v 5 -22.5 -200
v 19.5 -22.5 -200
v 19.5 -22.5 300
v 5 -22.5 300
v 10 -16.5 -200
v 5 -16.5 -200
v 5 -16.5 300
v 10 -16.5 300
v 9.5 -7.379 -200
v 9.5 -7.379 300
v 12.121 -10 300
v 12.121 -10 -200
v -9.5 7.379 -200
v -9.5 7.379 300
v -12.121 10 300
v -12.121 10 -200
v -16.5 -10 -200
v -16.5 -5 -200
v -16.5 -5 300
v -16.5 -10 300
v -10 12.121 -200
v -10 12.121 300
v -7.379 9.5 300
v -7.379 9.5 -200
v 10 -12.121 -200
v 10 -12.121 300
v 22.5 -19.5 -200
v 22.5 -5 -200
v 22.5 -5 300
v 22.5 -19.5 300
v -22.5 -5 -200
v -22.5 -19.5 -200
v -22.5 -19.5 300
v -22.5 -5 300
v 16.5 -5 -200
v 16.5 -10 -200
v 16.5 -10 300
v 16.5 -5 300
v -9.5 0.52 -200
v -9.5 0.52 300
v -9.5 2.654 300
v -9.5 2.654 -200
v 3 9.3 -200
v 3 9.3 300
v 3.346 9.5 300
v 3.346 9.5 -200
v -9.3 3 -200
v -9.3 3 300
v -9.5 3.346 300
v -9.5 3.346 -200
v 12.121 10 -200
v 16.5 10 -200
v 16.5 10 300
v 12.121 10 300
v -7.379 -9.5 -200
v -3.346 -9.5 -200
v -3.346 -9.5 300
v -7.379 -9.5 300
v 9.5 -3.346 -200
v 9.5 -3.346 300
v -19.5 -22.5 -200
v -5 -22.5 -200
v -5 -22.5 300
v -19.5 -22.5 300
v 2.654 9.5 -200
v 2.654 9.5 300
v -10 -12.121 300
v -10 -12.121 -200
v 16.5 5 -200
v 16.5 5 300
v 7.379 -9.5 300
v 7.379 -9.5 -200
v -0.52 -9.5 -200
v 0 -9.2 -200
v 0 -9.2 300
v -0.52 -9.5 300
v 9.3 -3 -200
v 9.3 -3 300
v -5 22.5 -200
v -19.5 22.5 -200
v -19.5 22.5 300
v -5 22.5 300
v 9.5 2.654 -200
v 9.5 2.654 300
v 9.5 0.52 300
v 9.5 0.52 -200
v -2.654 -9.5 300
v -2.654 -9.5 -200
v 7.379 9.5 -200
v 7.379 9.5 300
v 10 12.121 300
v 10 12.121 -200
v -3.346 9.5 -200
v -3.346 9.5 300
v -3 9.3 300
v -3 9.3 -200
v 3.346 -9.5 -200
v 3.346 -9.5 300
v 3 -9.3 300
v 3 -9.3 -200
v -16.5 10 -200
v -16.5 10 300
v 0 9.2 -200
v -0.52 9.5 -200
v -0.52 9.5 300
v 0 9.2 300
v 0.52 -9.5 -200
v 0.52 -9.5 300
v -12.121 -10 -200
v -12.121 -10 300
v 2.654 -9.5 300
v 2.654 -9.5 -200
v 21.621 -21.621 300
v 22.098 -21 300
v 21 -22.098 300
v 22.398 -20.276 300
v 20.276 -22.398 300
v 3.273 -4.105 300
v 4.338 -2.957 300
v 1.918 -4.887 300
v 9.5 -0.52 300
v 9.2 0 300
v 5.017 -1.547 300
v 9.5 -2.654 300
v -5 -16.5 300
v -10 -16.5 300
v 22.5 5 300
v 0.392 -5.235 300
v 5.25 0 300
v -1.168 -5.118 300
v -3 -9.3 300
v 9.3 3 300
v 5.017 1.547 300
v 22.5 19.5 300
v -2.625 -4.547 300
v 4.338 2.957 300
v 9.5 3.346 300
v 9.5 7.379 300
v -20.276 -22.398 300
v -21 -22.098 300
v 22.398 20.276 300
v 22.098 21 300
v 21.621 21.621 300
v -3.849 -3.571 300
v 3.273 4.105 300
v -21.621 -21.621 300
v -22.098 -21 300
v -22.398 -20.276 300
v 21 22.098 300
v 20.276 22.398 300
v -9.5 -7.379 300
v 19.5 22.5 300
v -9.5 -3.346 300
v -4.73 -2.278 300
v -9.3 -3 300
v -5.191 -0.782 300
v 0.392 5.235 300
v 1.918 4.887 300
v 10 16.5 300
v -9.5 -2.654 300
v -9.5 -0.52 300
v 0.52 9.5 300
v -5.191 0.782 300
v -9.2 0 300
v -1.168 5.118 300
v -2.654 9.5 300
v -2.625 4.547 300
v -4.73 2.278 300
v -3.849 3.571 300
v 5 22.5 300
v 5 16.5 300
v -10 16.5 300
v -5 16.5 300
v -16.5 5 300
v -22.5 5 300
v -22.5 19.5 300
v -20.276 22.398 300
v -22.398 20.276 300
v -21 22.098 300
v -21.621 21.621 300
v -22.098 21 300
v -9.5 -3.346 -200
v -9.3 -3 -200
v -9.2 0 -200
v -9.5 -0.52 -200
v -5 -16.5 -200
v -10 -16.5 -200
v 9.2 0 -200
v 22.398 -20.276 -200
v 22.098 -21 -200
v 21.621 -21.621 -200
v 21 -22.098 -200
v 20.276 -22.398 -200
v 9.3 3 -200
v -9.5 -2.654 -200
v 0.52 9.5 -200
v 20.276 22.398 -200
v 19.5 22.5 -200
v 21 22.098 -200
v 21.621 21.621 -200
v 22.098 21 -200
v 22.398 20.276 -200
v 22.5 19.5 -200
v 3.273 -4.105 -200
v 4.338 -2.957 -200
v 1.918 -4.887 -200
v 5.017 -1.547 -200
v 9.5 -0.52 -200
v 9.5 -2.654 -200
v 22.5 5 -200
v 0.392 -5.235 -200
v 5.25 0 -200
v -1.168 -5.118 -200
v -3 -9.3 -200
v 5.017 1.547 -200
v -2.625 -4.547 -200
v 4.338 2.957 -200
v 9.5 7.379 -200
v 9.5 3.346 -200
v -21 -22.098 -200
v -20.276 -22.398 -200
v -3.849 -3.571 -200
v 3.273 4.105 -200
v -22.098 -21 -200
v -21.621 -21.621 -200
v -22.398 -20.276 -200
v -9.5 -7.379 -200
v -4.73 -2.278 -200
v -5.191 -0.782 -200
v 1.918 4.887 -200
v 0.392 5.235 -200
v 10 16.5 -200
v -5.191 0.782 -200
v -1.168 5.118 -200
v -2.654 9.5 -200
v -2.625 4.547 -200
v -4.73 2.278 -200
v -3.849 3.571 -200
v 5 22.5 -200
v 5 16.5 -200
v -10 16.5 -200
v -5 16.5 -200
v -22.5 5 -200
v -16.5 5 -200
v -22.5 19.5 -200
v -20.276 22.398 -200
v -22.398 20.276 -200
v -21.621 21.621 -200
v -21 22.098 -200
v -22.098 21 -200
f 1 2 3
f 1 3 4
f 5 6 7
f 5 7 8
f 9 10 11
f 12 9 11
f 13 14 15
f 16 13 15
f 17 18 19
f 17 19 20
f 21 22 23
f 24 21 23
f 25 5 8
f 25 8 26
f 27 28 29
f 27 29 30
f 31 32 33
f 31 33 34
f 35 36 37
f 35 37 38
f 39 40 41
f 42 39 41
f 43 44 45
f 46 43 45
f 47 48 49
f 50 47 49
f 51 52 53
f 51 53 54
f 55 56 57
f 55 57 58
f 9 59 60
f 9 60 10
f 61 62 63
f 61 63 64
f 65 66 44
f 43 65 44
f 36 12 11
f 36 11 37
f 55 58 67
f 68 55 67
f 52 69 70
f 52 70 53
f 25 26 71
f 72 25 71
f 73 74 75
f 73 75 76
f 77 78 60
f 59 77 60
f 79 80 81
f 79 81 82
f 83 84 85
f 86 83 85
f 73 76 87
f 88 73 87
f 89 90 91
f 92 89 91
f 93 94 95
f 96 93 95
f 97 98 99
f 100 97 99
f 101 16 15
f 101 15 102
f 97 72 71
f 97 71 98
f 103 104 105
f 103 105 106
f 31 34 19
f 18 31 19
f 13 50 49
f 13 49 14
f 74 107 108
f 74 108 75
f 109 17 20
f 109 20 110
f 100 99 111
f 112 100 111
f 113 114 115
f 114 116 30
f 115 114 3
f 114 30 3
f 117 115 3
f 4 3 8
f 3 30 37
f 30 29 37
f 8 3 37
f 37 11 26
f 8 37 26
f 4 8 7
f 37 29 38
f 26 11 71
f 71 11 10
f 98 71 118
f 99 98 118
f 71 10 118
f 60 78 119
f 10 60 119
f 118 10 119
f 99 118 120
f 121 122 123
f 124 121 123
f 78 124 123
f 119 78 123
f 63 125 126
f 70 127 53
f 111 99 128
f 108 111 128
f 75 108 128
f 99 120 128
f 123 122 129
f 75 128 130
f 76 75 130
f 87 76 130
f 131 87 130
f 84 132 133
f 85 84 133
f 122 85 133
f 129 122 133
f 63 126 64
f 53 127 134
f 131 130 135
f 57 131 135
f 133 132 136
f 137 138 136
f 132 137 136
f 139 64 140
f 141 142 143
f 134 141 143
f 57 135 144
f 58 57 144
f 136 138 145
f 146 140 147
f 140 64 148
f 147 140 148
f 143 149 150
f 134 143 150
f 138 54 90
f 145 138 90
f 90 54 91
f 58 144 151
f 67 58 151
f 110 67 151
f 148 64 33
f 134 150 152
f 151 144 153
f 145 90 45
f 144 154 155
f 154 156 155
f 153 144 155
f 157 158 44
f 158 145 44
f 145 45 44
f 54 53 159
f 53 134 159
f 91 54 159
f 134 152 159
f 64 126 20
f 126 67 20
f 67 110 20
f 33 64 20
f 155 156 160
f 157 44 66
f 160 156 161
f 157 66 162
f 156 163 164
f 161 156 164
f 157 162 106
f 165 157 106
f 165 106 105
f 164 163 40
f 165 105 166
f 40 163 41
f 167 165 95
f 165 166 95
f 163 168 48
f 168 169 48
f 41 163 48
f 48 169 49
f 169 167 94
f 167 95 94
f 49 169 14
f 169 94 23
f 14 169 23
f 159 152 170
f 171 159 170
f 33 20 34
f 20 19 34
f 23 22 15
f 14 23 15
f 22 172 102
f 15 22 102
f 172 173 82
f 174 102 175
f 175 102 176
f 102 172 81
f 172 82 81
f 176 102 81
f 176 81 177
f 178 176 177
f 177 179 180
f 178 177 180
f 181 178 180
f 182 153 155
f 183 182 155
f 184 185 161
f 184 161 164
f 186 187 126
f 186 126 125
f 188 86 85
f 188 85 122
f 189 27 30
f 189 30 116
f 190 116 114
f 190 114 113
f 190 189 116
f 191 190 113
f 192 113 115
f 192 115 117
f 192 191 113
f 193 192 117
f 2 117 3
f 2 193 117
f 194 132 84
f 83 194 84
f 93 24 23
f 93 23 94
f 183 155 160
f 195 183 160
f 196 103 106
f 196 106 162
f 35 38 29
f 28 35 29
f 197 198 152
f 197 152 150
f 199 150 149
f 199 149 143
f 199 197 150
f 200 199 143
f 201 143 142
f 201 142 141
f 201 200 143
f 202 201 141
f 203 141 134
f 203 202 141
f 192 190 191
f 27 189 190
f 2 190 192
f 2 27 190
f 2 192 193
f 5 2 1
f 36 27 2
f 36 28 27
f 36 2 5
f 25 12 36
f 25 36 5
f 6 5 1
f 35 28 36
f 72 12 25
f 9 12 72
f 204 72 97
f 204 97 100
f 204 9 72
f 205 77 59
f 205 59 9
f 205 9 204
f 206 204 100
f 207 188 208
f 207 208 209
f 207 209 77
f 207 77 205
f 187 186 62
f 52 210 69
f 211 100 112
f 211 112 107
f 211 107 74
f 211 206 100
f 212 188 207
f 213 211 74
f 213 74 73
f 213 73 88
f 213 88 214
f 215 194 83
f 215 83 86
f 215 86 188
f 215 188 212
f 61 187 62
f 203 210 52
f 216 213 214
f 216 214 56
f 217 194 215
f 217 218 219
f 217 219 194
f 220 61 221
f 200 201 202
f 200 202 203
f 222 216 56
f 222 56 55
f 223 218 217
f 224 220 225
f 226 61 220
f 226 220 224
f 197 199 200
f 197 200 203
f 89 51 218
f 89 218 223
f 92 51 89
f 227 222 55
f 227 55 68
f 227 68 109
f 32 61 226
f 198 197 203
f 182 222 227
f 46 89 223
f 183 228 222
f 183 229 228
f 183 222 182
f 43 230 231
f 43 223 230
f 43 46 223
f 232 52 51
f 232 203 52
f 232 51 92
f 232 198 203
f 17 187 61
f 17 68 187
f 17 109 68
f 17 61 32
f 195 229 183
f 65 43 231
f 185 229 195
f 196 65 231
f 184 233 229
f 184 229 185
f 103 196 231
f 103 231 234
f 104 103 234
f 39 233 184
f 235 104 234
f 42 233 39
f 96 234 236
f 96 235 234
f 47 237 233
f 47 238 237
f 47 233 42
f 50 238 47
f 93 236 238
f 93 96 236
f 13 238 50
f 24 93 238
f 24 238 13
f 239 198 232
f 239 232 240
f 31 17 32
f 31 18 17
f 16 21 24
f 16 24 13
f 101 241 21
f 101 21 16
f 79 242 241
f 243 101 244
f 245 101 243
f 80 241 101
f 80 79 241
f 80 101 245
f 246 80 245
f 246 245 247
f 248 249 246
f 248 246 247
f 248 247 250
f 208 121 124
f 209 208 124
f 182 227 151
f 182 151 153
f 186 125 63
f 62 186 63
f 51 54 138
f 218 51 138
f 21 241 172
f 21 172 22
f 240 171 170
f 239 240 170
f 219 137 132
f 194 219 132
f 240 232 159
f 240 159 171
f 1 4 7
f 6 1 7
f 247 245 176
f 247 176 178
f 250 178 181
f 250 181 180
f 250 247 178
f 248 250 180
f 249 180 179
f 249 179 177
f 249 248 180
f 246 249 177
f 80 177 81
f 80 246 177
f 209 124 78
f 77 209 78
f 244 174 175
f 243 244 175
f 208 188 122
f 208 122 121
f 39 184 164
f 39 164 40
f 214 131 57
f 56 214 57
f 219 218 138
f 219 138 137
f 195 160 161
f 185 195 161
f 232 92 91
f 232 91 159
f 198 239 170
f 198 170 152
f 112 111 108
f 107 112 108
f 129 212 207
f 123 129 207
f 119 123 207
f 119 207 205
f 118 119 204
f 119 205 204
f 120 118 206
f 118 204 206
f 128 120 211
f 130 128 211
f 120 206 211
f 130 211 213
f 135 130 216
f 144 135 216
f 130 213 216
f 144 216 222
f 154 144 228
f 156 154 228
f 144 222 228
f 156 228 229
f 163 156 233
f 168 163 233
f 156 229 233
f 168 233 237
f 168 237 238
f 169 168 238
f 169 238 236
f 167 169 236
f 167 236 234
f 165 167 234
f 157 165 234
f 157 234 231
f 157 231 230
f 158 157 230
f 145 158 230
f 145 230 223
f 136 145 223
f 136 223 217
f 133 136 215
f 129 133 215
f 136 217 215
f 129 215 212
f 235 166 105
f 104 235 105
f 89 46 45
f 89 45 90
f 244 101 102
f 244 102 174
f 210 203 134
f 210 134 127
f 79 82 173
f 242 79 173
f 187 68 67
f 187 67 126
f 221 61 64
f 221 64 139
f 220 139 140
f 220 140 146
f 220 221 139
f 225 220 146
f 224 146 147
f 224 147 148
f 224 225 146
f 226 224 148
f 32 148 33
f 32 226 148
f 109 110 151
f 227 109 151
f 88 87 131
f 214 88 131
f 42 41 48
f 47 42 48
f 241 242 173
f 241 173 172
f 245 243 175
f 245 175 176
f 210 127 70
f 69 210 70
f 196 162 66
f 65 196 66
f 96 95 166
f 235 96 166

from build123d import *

# Parameters (mm, degrees)
SKETCH1_R           = 5.25
BOSS_EXTRUDE1_DEPTH = 500


with BuildPart() as part:
    # Sketch1 → Boss-Extrude1 (new body)
    with BuildSketch(Plane(origin=(0, 0, -200), x_dir=(-1, 0, 0), z_dir=(0, 0, -1))):
        with BuildLine():
            Line((19.5, 22.5), (5, 22.5))
            Line((5, 22.5), (5, 16.5))
            Line((5, 16.5), (10, 16.5))
            Line((10, 16.5), (10, 12.121320344))
            Line((10, 12.121320344), (7.378679656, 9.5))
            Line((7.378679656, 9.5), (3.346410162, 9.5))
            Line((3.346410162, 9.5), (3, 9.3))
            Line((3, 9.3), (2.653589838, 9.5))
            Line((2.653589838, 9.5), (0.519615242, 9.5))
            Line((0.519615242, 9.5), (0, 9.2))
            Line((0, 9.2), (-0.519615242, 9.5))
            Line((-0.519615242, 9.5), (-2.653589838, 9.5))
            Line((-2.653589838, 9.5), (-3, 9.3))
            Line((-3, 9.3), (-3.346410162, 9.5))
            Line((-3.346410162, 9.5), (-7.378679656, 9.5))
            Line((-7.378679656, 9.5), (-10, 12.121320344))
            Line((-10, 12.121320344), (-10, 16.5))
            Line((-10, 16.5), (-5, 16.5))
            Line((-5, 16.5), (-5, 22.5))
            Line((-5, 22.5), (-19.5, 22.5))
            ThreePointArc((-19.5, 22.5), (-21.621320344, 21.621320344), (-22.5, 19.5))
            Line((-22.5, 19.5), (-22.5, 5))
            Line((-22.5, 5), (-16.5, 5))
            Line((-16.5, 5), (-16.5, 10))
            Line((-16.5, 10), (-12.121320344, 10))
            Line((-12.121320344, 10), (-9.5, 7.378679656))
            Line((-9.5, 7.378679656), (-9.5, 3.346410162))
            Line((-9.5, 3.346410162), (-9.3, 3))
            Line((-9.3, 3), (-9.5, 2.653589838))
            Line((-9.5, 2.653589838), (-9.5, 0.519615242))
            Line((-9.5, 0.519615242), (-9.2, 0))
            Line((-9.2, 0), (-9.5, -0.519615242))
            Line((-9.5, -0.519615242), (-9.5, -2.653589838))
            Line((-9.5, -2.653589838), (-9.3, -3))
            Line((-9.3, -3), (-9.5, -3.346410162))
            Line((-9.5, -3.346410162), (-9.5, -7.378679656))
            Line((-9.5, -7.378679656), (-12.121320344, -10))
            Line((-12.121320344, -10), (-16.5, -10))
            Line((-16.5, -10), (-16.5, -5))
            Line((-16.5, -5), (-22.5, -5))
            Line((-22.5, -5), (-22.5, -19.5))
            ThreePointArc((-22.5, -19.5), (-21.621320344, -21.621320344), (-19.5, -22.5))
            Line((-19.5, -22.5), (-5, -22.5))
            Line((-5, -22.5), (-5, -16.5))
            Line((-5, -16.5), (-10, -16.5))
            Line((-10, -16.5), (-10, -12.121320344))
            Line((-10, -12.121320344), (-7.378679656, -9.5))
            Line((-7.378679656, -9.5), (-3.346410162, -9.5))
            Line((-3.346410162, -9.5), (-3, -9.3))
            Line((-3, -9.3), (-2.653589838, -9.5))
            Line((-2.653589838, -9.5), (-0.519615242, -9.5))
            Line((-0.519615242, -9.5), (0, -9.2))
            Line((0, -9.2), (0.519615242, -9.5))
            Line((0.519615242, -9.5), (2.653589838, -9.5))
            Line((2.653589838, -9.5), (3, -9.3))
            Line((3, -9.3), (3.346410162, -9.5))
            Line((3.346410162, -9.5), (7.378679656, -9.5))
            Line((7.378679656, -9.5), (10, -12.121320344))
            Line((10, -12.121320344), (10, -16.5))
            Line((10, -16.5), (5, -16.5))
            Line((5, -16.5), (5, -22.5))
            Line((5, -22.5), (19.5, -22.5))
            ThreePointArc((19.5, -22.5), (21.621320344, -21.621320344), (22.5, -19.5))
            Line((22.5, -19.5), (22.5, -5))
            Line((22.5, -5), (16.5, -5))
            Line((16.5, -5), (16.5, -10))
            Line((16.5, -10), (12.121320344, -10))
            Line((12.121320344, -10), (9.5, -7.378679656))
            Line((9.5, -7.378679656), (9.5, -3.346410162))
            Line((9.5, -3.346410162), (9.3, -3))
            Line((9.3, -3), (9.5, -2.653589838))
            Line((9.5, -2.653589838), (9.5, -0.519615242))
            Line((9.5, -0.519615242), (9.2, 0))
            Line((9.2, 0), (9.5, 0.519615242))
            Line((9.5, 0.519615242), (9.5, 2.653589838))
            Line((9.5, 2.653589838), (9.3, 3))
            Line((9.3, 3), (9.5, 3.346410162))
            Line((9.5, 3.346410162), (9.5, 7.378679656))
            Line((9.5, 7.378679656), (12.121320344, 10))
            Line((12.121320344, 10), (16.5, 10))
            Line((16.5, 10), (16.5, 5))
            Line((16.5, 5), (22.5, 5))
            Line((22.5, 5), (22.5, 19.5))
            ThreePointArc((22.5, 19.5), (21.621320344, 21.621320344), (19.5, 22.5))
        make_face()
        with Locations(Location((0, 0, 0), (0, 0, 180))):
            Circle(SKETCH1_R, mode=Mode.SUBTRACT)
    extrude(amount=-BOSS_EXTRUDE1_DEPTH)


solid = part.part
